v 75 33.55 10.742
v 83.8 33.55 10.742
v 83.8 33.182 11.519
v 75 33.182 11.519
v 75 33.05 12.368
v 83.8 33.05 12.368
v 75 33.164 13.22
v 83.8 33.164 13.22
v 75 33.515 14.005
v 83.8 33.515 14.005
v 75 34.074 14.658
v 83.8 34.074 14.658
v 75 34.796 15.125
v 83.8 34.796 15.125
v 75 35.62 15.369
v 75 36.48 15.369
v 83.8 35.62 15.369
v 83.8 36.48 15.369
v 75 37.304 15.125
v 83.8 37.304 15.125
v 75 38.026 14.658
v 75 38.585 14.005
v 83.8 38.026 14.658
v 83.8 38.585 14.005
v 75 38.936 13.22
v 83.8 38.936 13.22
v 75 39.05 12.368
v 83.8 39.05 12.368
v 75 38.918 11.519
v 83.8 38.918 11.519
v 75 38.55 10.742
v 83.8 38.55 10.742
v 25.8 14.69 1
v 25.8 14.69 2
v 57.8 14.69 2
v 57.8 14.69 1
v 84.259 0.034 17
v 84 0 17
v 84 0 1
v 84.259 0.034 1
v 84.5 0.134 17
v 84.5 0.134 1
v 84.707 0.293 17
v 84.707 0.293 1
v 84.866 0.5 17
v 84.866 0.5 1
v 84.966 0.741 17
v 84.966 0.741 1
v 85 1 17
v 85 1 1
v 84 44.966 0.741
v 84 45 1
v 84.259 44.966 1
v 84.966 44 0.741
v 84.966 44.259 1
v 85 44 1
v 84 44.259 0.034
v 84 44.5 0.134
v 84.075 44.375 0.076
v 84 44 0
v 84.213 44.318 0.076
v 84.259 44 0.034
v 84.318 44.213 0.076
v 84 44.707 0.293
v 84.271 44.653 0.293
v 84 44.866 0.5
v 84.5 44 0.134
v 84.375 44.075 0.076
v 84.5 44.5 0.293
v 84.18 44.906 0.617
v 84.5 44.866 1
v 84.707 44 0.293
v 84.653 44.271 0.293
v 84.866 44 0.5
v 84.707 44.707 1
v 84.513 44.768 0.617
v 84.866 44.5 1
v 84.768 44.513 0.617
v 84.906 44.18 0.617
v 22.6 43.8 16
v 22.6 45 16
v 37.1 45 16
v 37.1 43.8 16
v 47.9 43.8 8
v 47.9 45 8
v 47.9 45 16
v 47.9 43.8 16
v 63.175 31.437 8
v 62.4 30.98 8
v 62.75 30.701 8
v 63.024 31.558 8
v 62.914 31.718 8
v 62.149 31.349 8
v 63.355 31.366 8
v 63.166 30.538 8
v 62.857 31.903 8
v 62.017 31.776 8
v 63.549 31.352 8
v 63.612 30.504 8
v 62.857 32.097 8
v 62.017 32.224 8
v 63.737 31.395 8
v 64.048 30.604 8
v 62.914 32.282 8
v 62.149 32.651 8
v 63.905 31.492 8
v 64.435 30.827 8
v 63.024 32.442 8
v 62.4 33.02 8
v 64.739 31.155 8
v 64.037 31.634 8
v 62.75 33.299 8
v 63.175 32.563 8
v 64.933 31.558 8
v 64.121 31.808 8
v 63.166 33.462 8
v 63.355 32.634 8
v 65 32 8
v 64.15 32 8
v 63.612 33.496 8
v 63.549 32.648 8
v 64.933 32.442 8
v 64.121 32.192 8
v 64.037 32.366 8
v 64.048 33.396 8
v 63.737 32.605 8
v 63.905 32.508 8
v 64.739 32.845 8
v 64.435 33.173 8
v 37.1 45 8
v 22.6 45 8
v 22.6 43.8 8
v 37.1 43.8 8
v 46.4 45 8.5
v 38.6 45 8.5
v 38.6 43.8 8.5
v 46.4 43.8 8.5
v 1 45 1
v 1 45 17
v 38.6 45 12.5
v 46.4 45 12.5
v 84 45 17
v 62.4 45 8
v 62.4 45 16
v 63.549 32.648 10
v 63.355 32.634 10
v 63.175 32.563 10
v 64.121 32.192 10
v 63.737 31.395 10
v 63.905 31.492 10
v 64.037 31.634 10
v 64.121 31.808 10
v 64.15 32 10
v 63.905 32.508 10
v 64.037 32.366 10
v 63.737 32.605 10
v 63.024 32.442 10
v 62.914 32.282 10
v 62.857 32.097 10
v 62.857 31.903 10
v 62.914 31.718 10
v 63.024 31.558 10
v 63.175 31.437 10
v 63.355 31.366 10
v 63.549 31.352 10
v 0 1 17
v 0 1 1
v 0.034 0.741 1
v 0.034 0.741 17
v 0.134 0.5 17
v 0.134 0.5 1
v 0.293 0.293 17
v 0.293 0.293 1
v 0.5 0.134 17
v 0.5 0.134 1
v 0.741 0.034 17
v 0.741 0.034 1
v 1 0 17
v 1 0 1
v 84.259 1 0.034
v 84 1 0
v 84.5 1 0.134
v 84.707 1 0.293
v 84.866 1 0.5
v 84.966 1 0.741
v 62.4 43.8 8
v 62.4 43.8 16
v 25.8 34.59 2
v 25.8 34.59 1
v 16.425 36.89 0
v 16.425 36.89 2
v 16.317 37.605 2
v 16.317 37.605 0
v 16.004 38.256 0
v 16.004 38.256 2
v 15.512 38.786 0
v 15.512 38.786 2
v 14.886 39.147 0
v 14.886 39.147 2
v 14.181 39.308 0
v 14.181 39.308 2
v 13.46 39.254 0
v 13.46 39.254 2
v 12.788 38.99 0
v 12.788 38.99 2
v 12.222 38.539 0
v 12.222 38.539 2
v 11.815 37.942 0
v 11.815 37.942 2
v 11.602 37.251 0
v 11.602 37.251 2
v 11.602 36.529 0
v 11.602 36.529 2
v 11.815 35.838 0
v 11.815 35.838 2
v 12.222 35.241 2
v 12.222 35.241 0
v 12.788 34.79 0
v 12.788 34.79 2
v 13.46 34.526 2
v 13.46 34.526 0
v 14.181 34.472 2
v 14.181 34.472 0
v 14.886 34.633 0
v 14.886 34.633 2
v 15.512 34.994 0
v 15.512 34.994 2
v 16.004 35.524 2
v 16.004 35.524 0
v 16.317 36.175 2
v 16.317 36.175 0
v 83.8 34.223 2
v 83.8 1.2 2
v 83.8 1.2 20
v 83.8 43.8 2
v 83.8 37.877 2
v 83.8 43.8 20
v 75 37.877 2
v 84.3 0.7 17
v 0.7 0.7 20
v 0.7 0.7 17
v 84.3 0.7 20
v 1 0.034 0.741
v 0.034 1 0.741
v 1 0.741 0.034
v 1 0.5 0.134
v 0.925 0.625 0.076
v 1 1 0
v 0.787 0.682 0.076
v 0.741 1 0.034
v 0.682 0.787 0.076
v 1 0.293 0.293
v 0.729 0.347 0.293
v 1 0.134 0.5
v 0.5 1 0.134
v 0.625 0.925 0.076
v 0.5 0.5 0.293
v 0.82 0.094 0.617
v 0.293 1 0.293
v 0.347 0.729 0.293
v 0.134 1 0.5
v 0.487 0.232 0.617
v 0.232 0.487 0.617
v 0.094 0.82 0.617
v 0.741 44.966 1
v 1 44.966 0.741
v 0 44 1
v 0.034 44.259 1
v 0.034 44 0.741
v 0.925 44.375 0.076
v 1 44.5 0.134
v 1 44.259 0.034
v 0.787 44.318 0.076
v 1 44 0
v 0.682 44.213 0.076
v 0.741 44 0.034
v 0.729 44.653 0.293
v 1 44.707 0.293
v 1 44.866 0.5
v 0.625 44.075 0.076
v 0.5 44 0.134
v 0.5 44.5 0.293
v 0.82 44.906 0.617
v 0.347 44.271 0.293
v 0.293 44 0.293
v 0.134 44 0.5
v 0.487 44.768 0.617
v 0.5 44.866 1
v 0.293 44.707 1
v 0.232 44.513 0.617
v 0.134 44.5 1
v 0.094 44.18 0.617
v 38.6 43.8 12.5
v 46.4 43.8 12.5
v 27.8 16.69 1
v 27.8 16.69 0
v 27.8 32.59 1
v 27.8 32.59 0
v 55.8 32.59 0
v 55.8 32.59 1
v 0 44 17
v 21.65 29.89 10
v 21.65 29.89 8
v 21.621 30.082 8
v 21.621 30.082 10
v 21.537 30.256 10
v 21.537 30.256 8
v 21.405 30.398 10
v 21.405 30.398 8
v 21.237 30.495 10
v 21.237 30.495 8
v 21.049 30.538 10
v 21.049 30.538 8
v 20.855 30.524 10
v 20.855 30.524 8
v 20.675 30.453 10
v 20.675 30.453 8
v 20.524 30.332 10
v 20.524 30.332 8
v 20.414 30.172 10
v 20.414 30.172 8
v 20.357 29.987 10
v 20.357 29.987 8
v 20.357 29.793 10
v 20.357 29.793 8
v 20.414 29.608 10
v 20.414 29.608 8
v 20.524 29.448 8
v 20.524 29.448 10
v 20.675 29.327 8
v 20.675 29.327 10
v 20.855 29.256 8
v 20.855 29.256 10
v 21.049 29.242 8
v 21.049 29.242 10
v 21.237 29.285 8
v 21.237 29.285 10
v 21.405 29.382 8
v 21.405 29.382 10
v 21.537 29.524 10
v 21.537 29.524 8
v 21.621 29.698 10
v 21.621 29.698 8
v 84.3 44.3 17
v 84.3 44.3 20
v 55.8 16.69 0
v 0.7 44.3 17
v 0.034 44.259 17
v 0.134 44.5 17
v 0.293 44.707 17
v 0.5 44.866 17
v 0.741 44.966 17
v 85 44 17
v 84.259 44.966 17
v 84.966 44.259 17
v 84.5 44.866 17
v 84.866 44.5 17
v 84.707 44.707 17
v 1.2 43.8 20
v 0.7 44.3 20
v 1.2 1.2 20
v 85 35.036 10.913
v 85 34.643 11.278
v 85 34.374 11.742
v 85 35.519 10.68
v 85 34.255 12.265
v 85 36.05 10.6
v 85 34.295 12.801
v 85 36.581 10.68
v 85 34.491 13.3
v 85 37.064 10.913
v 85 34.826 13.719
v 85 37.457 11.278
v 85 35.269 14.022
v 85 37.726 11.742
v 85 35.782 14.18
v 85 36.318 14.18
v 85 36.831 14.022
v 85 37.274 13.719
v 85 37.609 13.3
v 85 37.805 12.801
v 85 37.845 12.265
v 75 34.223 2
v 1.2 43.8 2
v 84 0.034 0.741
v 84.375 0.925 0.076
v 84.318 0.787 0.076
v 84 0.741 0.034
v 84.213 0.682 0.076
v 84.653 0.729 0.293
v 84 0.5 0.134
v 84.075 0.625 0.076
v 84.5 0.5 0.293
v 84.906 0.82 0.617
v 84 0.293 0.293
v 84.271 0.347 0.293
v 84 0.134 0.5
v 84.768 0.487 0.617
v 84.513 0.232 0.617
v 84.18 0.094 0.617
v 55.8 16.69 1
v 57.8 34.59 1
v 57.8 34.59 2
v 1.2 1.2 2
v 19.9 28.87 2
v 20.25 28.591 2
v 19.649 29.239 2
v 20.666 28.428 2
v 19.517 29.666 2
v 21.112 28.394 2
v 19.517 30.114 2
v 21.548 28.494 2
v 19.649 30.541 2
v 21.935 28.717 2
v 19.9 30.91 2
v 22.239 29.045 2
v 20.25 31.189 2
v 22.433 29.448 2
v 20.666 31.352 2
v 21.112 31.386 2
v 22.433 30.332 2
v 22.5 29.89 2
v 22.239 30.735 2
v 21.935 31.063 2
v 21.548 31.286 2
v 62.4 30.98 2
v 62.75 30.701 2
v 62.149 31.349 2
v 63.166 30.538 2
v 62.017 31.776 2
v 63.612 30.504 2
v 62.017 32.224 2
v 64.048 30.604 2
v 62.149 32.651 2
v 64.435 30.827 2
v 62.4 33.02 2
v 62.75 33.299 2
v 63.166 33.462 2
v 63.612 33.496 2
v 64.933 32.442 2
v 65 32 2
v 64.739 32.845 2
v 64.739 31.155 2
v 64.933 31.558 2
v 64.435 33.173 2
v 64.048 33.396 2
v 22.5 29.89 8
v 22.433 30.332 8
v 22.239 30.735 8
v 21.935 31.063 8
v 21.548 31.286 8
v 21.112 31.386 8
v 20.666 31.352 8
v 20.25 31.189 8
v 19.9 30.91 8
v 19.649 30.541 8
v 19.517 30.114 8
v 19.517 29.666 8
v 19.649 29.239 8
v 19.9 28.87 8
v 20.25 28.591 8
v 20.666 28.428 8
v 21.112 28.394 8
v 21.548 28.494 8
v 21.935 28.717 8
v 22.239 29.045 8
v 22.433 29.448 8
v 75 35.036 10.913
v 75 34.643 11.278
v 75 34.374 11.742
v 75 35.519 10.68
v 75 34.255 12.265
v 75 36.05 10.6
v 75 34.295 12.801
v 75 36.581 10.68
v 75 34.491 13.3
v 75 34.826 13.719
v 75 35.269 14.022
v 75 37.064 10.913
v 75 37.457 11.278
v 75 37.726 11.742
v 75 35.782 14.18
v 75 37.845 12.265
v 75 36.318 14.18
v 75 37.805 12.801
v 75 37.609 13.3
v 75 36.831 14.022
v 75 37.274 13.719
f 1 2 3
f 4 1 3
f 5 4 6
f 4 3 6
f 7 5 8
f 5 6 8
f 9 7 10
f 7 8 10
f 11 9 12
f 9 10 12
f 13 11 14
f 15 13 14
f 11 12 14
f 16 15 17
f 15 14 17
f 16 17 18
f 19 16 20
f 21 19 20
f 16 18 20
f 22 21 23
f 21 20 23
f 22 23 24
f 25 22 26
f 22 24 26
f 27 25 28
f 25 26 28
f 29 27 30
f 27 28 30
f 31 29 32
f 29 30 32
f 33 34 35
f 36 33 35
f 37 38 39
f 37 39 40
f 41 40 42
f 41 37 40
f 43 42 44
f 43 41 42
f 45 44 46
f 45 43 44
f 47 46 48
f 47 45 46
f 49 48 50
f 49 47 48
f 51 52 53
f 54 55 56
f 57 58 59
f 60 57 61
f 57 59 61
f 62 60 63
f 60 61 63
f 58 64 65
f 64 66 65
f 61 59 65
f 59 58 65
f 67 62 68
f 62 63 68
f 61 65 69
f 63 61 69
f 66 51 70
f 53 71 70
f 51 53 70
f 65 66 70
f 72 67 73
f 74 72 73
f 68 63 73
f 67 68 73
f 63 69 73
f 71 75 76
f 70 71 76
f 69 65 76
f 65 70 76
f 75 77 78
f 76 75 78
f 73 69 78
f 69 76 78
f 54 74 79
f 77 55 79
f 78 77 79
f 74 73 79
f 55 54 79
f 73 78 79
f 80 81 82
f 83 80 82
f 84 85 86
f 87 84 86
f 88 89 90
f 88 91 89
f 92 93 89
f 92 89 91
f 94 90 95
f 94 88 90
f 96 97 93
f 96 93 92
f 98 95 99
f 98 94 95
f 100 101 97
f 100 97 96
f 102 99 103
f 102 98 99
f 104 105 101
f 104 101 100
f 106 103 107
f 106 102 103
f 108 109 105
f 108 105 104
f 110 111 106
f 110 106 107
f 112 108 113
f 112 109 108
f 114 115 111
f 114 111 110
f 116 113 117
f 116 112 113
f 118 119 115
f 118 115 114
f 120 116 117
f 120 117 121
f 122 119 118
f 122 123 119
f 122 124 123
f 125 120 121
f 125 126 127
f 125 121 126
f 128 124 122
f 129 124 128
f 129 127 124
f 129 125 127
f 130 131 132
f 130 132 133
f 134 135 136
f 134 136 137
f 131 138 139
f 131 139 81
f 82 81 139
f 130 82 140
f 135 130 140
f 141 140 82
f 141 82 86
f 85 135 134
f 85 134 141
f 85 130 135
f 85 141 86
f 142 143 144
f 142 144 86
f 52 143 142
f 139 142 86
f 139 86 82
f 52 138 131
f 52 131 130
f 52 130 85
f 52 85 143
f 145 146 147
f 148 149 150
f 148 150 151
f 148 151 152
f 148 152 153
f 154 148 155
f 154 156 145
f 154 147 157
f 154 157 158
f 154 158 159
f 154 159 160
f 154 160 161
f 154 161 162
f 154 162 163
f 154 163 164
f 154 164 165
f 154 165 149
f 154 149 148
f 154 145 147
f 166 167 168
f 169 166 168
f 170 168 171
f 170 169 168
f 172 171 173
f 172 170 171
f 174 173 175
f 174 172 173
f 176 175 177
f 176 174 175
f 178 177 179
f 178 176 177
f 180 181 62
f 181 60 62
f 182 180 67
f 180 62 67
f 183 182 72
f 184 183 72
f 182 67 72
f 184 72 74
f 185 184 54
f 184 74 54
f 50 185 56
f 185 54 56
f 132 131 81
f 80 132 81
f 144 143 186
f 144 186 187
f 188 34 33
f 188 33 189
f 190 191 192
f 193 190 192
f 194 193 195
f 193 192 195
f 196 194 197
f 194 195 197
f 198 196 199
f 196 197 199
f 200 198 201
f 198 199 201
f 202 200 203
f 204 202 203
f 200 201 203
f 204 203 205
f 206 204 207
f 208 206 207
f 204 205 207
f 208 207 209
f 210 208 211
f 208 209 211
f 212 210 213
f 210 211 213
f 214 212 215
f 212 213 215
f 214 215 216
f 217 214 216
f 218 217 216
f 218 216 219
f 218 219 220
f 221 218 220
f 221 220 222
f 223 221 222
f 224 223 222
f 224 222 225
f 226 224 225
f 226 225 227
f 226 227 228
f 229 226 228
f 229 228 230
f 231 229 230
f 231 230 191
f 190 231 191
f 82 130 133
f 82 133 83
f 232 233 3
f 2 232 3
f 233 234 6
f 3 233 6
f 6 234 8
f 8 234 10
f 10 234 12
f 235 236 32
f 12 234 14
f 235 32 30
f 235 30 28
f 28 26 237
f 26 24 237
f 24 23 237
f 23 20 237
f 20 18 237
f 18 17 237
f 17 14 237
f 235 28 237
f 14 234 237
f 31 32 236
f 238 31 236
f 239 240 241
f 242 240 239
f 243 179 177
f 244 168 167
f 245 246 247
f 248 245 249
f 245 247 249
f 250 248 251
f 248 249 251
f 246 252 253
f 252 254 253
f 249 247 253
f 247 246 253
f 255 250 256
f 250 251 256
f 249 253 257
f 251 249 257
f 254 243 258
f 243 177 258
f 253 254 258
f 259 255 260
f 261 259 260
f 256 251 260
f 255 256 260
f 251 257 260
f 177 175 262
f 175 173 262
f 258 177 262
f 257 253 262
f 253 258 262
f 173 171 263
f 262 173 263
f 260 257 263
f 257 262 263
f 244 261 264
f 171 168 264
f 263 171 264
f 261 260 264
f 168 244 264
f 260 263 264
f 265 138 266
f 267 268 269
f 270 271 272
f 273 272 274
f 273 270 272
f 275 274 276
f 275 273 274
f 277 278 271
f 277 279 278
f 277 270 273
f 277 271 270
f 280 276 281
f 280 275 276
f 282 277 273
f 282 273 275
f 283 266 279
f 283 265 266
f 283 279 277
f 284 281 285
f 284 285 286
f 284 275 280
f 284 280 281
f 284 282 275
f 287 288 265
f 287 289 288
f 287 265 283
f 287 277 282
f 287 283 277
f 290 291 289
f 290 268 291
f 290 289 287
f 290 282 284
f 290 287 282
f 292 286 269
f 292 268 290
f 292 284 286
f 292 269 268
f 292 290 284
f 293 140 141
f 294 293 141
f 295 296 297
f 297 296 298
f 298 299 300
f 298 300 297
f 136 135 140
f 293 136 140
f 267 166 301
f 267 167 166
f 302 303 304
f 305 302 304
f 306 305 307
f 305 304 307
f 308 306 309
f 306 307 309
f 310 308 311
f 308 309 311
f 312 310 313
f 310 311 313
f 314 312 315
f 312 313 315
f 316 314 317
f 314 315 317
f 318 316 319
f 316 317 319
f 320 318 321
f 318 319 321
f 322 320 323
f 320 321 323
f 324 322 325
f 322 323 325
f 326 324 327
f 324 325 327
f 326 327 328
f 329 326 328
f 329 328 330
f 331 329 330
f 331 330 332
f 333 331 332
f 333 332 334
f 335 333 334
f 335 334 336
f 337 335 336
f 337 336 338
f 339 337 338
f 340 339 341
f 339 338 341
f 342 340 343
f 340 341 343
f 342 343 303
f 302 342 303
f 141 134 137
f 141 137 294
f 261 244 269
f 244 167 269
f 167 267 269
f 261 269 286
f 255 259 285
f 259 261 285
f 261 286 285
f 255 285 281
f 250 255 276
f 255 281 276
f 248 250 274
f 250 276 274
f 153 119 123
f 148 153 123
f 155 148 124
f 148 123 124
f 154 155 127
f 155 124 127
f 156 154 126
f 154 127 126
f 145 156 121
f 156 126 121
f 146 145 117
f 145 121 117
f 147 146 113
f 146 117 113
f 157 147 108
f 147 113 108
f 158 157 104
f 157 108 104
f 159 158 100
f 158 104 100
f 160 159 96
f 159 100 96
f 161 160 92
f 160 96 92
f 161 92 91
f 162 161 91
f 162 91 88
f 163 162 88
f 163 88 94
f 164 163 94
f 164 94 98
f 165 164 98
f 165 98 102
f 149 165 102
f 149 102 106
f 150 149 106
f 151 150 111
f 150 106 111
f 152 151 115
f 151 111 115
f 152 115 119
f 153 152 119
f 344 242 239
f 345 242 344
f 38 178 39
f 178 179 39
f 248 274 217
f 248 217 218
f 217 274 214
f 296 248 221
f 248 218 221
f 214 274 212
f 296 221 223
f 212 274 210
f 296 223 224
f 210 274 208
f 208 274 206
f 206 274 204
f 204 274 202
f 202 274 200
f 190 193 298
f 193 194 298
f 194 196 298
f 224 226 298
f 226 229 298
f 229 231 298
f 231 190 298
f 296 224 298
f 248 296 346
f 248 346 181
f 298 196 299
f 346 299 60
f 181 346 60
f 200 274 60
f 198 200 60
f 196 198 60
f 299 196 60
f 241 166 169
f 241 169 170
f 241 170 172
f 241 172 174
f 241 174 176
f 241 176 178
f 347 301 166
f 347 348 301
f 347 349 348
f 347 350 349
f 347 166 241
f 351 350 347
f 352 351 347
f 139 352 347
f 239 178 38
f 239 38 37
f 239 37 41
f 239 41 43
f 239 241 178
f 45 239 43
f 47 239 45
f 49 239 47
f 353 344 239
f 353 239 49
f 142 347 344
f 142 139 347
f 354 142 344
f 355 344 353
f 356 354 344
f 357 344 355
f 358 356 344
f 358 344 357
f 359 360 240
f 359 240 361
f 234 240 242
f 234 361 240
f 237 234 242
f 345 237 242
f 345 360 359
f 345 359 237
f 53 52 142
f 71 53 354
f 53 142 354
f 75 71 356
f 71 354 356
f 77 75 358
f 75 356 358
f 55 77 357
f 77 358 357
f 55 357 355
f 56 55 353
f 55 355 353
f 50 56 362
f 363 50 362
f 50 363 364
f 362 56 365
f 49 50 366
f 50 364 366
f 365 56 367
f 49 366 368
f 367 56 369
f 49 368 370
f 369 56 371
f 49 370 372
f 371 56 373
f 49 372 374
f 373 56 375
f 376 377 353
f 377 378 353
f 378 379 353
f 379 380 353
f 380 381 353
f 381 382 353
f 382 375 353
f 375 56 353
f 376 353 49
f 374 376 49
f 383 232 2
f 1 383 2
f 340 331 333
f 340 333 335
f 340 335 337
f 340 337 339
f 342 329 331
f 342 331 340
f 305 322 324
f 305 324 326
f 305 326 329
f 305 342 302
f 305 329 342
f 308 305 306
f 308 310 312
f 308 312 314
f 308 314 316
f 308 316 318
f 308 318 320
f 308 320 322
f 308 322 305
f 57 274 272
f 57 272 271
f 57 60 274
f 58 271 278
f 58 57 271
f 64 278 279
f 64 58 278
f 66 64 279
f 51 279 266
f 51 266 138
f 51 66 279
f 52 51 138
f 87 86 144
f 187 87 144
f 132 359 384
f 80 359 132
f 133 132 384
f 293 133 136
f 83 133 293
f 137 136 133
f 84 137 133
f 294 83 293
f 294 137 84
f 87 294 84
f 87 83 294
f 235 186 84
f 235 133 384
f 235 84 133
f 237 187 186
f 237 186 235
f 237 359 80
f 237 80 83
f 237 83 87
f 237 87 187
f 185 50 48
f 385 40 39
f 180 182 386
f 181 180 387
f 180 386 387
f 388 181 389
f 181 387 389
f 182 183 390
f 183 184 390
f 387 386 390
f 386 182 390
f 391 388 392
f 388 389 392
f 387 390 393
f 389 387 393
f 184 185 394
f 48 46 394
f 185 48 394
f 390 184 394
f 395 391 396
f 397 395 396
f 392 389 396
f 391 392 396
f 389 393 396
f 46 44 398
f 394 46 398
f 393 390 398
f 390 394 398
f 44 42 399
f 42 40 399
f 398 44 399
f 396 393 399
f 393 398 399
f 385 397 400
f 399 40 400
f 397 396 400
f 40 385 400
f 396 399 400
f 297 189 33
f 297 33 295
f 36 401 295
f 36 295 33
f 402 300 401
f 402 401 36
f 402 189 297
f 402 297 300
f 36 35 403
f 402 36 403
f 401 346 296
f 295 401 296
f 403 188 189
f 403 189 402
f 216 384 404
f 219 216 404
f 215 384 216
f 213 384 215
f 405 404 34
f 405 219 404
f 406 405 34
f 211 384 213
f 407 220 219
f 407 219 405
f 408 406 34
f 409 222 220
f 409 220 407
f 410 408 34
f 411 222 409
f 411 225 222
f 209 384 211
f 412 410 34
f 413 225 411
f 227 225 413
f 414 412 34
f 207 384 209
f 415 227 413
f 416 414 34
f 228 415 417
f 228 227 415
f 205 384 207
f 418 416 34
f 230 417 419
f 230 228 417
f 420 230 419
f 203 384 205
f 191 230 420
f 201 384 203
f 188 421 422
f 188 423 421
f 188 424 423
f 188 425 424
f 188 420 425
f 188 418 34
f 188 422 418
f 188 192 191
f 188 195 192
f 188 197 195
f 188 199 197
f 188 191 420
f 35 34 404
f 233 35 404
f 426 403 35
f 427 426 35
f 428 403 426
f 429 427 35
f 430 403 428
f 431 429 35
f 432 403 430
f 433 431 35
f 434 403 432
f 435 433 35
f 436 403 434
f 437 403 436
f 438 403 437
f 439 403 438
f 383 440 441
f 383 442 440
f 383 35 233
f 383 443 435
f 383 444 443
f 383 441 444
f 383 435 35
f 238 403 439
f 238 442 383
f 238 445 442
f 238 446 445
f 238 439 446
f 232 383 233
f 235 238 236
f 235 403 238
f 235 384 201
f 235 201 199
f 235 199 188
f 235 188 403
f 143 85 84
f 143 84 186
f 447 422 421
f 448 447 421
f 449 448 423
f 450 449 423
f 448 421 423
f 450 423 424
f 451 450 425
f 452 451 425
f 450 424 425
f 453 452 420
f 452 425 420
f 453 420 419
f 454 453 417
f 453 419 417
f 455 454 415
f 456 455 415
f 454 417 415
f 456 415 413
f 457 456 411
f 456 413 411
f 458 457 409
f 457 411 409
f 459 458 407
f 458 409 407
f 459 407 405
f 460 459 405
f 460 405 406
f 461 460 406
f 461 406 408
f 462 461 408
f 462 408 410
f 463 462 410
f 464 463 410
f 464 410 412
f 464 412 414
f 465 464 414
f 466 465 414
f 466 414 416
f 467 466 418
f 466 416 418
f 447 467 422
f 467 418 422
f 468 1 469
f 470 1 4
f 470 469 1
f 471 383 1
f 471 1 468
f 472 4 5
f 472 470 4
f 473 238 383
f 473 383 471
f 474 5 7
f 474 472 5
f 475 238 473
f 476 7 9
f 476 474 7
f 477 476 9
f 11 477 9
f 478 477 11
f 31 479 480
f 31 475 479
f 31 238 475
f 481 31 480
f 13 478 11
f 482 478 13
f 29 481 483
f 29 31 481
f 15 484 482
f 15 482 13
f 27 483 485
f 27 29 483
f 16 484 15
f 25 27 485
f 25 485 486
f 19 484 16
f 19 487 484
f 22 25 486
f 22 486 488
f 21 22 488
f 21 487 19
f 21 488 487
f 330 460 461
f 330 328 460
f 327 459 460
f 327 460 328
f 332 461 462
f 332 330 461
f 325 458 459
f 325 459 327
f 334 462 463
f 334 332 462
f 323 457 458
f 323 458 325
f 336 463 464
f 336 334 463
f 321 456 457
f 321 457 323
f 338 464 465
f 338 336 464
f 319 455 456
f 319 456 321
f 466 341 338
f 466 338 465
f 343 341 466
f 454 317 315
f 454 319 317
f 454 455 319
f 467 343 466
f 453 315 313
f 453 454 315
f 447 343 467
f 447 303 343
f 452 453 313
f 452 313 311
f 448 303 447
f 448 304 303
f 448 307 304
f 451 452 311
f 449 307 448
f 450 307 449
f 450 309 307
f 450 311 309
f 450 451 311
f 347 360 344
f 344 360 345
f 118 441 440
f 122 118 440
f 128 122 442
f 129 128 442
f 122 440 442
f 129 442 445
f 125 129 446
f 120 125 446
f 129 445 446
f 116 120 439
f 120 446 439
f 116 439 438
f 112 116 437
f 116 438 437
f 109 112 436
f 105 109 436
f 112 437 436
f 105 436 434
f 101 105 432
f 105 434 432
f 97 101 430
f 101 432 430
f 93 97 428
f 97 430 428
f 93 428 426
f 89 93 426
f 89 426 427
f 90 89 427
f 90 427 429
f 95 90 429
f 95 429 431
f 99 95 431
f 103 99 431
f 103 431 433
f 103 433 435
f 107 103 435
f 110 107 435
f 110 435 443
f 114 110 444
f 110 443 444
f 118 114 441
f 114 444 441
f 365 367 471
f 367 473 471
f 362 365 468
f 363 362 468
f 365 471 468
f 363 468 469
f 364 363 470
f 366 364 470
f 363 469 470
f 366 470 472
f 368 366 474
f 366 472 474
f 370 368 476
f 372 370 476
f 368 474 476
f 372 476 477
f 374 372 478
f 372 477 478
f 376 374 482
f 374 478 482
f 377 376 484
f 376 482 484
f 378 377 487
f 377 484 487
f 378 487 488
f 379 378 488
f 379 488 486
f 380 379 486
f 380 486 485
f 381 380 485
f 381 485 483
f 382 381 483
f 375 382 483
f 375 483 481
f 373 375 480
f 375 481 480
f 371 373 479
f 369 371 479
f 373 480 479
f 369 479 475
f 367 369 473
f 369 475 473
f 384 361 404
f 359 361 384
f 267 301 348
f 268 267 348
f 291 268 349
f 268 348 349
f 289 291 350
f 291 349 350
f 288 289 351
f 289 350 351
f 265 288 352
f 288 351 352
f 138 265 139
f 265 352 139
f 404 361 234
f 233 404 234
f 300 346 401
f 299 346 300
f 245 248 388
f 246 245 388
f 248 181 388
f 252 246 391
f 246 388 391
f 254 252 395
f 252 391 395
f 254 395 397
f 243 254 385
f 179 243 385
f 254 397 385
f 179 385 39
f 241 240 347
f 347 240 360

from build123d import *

# Parameters (mm, degrees)
SKETCH_1_W          = 85
SKETCH_1_H          = 45
EXTRUDE_1_DEPTH     = 20
SKETCH_2_W          = 82.6
SKETCH_2_H          = 42.6
CUT_EXTRUDE_1_DEPTH = 18
SKETCH_3_R          = 52.564832307
SKETCH_3_W          = 83.6
SKETCH_3_H          = 43.6
CUT_EXTRUDE_2_DEPTH = 3
SKETCH_4_R          = 1.5
CUT_EXTRUDE_3_DEPTH = 10
SKETCH_6_R          = 1.5
EXTRUDE_2_DEPTH     = 6
SKETCH_7_R          = 0.65
EXTRUDE_3_DEPTH     = 2
SKETCH_5_W          = 28
SKETCH_5_H          = 15.9
CUT_EXTRUDE_4_DEPTH = 99.234413522
SKETCH_9_W          = 32
SKETCH_9_H          = 19.9
CUT_EXTRUDE_5_DEPTH = 1
SKETCH_10_W         = 14.5
SKETCH_10_H         = 8
SKETCH_10_W_2       = 7.8
SKETCH_10_H_2       = 4
CUT_EXTRUDE_6_DEPTH = 10
FILLET_1_R          = 1
SKETCH_11_R         = 1.8
EXTRUDE_4_DEPTH     = 10
SKETCH_12_R         = 1.8
CUT_EXTRUDE_7_DEPTH = 90.721792225
SKETCH_13_R         = 2.425
CUT_EXTRUDE_8_DEPTH = 98.846819059


with BuildPart() as part:
    # Эскиз1 → Бобышка-Вытянуть1 (new body)
    with BuildSketch(Plane.XY):
        with Locations((42.5, 22.5)):
            Rectangle(SKETCH_1_W, SKETCH_1_H)
    extrude(amount=EXTRUDE_1_DEPTH)

    # Эскиз2 → Вырез-Вытянуть1 (cut)
    with BuildSketch(Plane.XY.offset(20)):
        with Locations((42.5, 22.5)):
            Rectangle(SKETCH_2_W, SKETCH_2_H)
    extrude(amount=-CUT_EXTRUDE_1_DEPTH, mode=Mode.SUBTRACT)

    # Эскиз3 → Вырез-Вытянуть2 (cut)
    with BuildSketch(Plane.XY.offset(20)):
        with Locations((42.5, 22.5)):
            Circle(SKETCH_3_R)
        with Locations((42.5, 22.5)):
            Rectangle(SKETCH_3_W, SKETCH_3_H, mode=Mode.SUBTRACT)
    extrude(amount=-CUT_EXTRUDE_2_DEPTH, mode=Mode.SUBTRACT)

    # Эскиз4 → Вырез-Вытянуть3 (cut)
    with BuildSketch(Plane.ZY.offset(-85)):
        with Locations(Location((12.4, 36.05, 0), (0, 0, 180))):
            Circle(SKETCH_4_R)
    extrude(amount=CUT_EXTRUDE_3_DEPTH, mode=Mode.SUBTRACT)

    # Эскиз6 → Бобышка-Вытянуть2 (add)
    with BuildSketch(Plane.XY.offset(2)):
        with Locations((21, 29.89)):
            Circle(SKETCH_6_R)
        with Locations((63.5, 32)):
            Circle(SKETCH_6_R)
    extrude(amount=EXTRUDE_2_DEPTH)

    # Эскиз7 → Бобышка-Вытянуть3 (add)
    with BuildSketch(Plane.XY.offset(8)):
        with Locations((21, 29.89)):
            Circle(SKETCH_7_R)
        with Locations((63.5, 32)):
            Circle(SKETCH_7_R)
    extrude(amount=EXTRUDE_3_DEPTH)

    # Эскиз5 → Вырез-Вытянуть4 (cut, through all)
    with BuildSketch(Plane(origin=(0, 0, 0), x_dir=(-1, 0, 0), z_dir=(0, 0, -1))):
        with Locations((-41.8, 24.64)):
            Rectangle(SKETCH_5_W, SKETCH_5_H)
    extrude(amount=-CUT_EXTRUDE_4_DEPTH, mode=Mode.SUBTRACT)

    # Эскиз9 → Вырез-Вытянуть5 (cut)
    with BuildSketch(Plane.XY.offset(2)):
        with Locations((41.8, 24.64)):
            Rectangle(SKETCH_9_W, SKETCH_9_H)
    extrude(amount=-CUT_EXTRUDE_5_DEPTH, mode=Mode.SUBTRACT)

    # Эскиз10 → Вырез-Вытянуть6 (cut)
    with BuildSketch(Plane.XZ.offset(-45)):
        with Locations((29.85, 12)):
            Rectangle(SKETCH_10_W, SKETCH_10_H)
        with Locations((55.15, 12)):
            Rectangle(SKETCH_10_W, SKETCH_10_H)
        with Locations((42.5, 10.5)):
            Rectangle(SKETCH_10_W_2, SKETCH_10_H_2)
    extrude(amount=CUT_EXTRUDE_6_DEPTH, mode=Mode.SUBTRACT)

    # Скругление1
    fillet_1_edges = [part.edges().sort_by_distance(p)[0] for p in [
        (0, 45, 8.5),
        (85, 45, 8.5),
        (85, 0, 8.5),
        (0, 0, 8.5),
        (42.5, 45, 0),
        (85, 22.5, 0),
        (42.5, 0, 0),
        (0, 22.5, 0),
    ]]
    fillet(fillet_1_edges, radius=FILLET_1_R)

    # Эскиз11 → Бобышка-Вытянуть4 (add)
    with BuildSketch(Plane.ZY.offset(-85)):
        with BuildLine():
            Line((1, 37.8), (1, 34.3))
            Line((1, 34.3), (10.741687605, 33.55))
            ThreePointArc((10.741687605, 33.55), (15.4, 36.05), (10.741687605, 38.55))
            Line((10.741687605, 38.55), (1, 37.8))
        make_face()
        with Locations(Location((12.4, 36.05, 0), (0, 0, 180))):
            Circle(SKETCH_11_R, mode=Mode.SUBTRACT)
    extrude(amount=EXTRUDE_4_DEPTH)

    # Эскиз12 → Вырез-Вытянуть7 (cut, through all)
    with BuildSketch(Plane.ZY.offset(-75)):
        with Locations(Location((12.4, 36.05, 0), (0, 0, 180))):
            Circle(SKETCH_12_R)
    extrude(amount=-CUT_EXTRUDE_7_DEPTH, mode=Mode.SUBTRACT)

    # Эскиз13 → Вырез-Вытянуть8 (cut, through all)
    with BuildSketch(Plane.XY.offset(2)):
        with Locations((14, 36.89)):
            Circle(SKETCH_13_R)
    extrude(amount=-CUT_EXTRUDE_8_DEPTH, mode=Mode.SUBTRACT)


solid = part.part
